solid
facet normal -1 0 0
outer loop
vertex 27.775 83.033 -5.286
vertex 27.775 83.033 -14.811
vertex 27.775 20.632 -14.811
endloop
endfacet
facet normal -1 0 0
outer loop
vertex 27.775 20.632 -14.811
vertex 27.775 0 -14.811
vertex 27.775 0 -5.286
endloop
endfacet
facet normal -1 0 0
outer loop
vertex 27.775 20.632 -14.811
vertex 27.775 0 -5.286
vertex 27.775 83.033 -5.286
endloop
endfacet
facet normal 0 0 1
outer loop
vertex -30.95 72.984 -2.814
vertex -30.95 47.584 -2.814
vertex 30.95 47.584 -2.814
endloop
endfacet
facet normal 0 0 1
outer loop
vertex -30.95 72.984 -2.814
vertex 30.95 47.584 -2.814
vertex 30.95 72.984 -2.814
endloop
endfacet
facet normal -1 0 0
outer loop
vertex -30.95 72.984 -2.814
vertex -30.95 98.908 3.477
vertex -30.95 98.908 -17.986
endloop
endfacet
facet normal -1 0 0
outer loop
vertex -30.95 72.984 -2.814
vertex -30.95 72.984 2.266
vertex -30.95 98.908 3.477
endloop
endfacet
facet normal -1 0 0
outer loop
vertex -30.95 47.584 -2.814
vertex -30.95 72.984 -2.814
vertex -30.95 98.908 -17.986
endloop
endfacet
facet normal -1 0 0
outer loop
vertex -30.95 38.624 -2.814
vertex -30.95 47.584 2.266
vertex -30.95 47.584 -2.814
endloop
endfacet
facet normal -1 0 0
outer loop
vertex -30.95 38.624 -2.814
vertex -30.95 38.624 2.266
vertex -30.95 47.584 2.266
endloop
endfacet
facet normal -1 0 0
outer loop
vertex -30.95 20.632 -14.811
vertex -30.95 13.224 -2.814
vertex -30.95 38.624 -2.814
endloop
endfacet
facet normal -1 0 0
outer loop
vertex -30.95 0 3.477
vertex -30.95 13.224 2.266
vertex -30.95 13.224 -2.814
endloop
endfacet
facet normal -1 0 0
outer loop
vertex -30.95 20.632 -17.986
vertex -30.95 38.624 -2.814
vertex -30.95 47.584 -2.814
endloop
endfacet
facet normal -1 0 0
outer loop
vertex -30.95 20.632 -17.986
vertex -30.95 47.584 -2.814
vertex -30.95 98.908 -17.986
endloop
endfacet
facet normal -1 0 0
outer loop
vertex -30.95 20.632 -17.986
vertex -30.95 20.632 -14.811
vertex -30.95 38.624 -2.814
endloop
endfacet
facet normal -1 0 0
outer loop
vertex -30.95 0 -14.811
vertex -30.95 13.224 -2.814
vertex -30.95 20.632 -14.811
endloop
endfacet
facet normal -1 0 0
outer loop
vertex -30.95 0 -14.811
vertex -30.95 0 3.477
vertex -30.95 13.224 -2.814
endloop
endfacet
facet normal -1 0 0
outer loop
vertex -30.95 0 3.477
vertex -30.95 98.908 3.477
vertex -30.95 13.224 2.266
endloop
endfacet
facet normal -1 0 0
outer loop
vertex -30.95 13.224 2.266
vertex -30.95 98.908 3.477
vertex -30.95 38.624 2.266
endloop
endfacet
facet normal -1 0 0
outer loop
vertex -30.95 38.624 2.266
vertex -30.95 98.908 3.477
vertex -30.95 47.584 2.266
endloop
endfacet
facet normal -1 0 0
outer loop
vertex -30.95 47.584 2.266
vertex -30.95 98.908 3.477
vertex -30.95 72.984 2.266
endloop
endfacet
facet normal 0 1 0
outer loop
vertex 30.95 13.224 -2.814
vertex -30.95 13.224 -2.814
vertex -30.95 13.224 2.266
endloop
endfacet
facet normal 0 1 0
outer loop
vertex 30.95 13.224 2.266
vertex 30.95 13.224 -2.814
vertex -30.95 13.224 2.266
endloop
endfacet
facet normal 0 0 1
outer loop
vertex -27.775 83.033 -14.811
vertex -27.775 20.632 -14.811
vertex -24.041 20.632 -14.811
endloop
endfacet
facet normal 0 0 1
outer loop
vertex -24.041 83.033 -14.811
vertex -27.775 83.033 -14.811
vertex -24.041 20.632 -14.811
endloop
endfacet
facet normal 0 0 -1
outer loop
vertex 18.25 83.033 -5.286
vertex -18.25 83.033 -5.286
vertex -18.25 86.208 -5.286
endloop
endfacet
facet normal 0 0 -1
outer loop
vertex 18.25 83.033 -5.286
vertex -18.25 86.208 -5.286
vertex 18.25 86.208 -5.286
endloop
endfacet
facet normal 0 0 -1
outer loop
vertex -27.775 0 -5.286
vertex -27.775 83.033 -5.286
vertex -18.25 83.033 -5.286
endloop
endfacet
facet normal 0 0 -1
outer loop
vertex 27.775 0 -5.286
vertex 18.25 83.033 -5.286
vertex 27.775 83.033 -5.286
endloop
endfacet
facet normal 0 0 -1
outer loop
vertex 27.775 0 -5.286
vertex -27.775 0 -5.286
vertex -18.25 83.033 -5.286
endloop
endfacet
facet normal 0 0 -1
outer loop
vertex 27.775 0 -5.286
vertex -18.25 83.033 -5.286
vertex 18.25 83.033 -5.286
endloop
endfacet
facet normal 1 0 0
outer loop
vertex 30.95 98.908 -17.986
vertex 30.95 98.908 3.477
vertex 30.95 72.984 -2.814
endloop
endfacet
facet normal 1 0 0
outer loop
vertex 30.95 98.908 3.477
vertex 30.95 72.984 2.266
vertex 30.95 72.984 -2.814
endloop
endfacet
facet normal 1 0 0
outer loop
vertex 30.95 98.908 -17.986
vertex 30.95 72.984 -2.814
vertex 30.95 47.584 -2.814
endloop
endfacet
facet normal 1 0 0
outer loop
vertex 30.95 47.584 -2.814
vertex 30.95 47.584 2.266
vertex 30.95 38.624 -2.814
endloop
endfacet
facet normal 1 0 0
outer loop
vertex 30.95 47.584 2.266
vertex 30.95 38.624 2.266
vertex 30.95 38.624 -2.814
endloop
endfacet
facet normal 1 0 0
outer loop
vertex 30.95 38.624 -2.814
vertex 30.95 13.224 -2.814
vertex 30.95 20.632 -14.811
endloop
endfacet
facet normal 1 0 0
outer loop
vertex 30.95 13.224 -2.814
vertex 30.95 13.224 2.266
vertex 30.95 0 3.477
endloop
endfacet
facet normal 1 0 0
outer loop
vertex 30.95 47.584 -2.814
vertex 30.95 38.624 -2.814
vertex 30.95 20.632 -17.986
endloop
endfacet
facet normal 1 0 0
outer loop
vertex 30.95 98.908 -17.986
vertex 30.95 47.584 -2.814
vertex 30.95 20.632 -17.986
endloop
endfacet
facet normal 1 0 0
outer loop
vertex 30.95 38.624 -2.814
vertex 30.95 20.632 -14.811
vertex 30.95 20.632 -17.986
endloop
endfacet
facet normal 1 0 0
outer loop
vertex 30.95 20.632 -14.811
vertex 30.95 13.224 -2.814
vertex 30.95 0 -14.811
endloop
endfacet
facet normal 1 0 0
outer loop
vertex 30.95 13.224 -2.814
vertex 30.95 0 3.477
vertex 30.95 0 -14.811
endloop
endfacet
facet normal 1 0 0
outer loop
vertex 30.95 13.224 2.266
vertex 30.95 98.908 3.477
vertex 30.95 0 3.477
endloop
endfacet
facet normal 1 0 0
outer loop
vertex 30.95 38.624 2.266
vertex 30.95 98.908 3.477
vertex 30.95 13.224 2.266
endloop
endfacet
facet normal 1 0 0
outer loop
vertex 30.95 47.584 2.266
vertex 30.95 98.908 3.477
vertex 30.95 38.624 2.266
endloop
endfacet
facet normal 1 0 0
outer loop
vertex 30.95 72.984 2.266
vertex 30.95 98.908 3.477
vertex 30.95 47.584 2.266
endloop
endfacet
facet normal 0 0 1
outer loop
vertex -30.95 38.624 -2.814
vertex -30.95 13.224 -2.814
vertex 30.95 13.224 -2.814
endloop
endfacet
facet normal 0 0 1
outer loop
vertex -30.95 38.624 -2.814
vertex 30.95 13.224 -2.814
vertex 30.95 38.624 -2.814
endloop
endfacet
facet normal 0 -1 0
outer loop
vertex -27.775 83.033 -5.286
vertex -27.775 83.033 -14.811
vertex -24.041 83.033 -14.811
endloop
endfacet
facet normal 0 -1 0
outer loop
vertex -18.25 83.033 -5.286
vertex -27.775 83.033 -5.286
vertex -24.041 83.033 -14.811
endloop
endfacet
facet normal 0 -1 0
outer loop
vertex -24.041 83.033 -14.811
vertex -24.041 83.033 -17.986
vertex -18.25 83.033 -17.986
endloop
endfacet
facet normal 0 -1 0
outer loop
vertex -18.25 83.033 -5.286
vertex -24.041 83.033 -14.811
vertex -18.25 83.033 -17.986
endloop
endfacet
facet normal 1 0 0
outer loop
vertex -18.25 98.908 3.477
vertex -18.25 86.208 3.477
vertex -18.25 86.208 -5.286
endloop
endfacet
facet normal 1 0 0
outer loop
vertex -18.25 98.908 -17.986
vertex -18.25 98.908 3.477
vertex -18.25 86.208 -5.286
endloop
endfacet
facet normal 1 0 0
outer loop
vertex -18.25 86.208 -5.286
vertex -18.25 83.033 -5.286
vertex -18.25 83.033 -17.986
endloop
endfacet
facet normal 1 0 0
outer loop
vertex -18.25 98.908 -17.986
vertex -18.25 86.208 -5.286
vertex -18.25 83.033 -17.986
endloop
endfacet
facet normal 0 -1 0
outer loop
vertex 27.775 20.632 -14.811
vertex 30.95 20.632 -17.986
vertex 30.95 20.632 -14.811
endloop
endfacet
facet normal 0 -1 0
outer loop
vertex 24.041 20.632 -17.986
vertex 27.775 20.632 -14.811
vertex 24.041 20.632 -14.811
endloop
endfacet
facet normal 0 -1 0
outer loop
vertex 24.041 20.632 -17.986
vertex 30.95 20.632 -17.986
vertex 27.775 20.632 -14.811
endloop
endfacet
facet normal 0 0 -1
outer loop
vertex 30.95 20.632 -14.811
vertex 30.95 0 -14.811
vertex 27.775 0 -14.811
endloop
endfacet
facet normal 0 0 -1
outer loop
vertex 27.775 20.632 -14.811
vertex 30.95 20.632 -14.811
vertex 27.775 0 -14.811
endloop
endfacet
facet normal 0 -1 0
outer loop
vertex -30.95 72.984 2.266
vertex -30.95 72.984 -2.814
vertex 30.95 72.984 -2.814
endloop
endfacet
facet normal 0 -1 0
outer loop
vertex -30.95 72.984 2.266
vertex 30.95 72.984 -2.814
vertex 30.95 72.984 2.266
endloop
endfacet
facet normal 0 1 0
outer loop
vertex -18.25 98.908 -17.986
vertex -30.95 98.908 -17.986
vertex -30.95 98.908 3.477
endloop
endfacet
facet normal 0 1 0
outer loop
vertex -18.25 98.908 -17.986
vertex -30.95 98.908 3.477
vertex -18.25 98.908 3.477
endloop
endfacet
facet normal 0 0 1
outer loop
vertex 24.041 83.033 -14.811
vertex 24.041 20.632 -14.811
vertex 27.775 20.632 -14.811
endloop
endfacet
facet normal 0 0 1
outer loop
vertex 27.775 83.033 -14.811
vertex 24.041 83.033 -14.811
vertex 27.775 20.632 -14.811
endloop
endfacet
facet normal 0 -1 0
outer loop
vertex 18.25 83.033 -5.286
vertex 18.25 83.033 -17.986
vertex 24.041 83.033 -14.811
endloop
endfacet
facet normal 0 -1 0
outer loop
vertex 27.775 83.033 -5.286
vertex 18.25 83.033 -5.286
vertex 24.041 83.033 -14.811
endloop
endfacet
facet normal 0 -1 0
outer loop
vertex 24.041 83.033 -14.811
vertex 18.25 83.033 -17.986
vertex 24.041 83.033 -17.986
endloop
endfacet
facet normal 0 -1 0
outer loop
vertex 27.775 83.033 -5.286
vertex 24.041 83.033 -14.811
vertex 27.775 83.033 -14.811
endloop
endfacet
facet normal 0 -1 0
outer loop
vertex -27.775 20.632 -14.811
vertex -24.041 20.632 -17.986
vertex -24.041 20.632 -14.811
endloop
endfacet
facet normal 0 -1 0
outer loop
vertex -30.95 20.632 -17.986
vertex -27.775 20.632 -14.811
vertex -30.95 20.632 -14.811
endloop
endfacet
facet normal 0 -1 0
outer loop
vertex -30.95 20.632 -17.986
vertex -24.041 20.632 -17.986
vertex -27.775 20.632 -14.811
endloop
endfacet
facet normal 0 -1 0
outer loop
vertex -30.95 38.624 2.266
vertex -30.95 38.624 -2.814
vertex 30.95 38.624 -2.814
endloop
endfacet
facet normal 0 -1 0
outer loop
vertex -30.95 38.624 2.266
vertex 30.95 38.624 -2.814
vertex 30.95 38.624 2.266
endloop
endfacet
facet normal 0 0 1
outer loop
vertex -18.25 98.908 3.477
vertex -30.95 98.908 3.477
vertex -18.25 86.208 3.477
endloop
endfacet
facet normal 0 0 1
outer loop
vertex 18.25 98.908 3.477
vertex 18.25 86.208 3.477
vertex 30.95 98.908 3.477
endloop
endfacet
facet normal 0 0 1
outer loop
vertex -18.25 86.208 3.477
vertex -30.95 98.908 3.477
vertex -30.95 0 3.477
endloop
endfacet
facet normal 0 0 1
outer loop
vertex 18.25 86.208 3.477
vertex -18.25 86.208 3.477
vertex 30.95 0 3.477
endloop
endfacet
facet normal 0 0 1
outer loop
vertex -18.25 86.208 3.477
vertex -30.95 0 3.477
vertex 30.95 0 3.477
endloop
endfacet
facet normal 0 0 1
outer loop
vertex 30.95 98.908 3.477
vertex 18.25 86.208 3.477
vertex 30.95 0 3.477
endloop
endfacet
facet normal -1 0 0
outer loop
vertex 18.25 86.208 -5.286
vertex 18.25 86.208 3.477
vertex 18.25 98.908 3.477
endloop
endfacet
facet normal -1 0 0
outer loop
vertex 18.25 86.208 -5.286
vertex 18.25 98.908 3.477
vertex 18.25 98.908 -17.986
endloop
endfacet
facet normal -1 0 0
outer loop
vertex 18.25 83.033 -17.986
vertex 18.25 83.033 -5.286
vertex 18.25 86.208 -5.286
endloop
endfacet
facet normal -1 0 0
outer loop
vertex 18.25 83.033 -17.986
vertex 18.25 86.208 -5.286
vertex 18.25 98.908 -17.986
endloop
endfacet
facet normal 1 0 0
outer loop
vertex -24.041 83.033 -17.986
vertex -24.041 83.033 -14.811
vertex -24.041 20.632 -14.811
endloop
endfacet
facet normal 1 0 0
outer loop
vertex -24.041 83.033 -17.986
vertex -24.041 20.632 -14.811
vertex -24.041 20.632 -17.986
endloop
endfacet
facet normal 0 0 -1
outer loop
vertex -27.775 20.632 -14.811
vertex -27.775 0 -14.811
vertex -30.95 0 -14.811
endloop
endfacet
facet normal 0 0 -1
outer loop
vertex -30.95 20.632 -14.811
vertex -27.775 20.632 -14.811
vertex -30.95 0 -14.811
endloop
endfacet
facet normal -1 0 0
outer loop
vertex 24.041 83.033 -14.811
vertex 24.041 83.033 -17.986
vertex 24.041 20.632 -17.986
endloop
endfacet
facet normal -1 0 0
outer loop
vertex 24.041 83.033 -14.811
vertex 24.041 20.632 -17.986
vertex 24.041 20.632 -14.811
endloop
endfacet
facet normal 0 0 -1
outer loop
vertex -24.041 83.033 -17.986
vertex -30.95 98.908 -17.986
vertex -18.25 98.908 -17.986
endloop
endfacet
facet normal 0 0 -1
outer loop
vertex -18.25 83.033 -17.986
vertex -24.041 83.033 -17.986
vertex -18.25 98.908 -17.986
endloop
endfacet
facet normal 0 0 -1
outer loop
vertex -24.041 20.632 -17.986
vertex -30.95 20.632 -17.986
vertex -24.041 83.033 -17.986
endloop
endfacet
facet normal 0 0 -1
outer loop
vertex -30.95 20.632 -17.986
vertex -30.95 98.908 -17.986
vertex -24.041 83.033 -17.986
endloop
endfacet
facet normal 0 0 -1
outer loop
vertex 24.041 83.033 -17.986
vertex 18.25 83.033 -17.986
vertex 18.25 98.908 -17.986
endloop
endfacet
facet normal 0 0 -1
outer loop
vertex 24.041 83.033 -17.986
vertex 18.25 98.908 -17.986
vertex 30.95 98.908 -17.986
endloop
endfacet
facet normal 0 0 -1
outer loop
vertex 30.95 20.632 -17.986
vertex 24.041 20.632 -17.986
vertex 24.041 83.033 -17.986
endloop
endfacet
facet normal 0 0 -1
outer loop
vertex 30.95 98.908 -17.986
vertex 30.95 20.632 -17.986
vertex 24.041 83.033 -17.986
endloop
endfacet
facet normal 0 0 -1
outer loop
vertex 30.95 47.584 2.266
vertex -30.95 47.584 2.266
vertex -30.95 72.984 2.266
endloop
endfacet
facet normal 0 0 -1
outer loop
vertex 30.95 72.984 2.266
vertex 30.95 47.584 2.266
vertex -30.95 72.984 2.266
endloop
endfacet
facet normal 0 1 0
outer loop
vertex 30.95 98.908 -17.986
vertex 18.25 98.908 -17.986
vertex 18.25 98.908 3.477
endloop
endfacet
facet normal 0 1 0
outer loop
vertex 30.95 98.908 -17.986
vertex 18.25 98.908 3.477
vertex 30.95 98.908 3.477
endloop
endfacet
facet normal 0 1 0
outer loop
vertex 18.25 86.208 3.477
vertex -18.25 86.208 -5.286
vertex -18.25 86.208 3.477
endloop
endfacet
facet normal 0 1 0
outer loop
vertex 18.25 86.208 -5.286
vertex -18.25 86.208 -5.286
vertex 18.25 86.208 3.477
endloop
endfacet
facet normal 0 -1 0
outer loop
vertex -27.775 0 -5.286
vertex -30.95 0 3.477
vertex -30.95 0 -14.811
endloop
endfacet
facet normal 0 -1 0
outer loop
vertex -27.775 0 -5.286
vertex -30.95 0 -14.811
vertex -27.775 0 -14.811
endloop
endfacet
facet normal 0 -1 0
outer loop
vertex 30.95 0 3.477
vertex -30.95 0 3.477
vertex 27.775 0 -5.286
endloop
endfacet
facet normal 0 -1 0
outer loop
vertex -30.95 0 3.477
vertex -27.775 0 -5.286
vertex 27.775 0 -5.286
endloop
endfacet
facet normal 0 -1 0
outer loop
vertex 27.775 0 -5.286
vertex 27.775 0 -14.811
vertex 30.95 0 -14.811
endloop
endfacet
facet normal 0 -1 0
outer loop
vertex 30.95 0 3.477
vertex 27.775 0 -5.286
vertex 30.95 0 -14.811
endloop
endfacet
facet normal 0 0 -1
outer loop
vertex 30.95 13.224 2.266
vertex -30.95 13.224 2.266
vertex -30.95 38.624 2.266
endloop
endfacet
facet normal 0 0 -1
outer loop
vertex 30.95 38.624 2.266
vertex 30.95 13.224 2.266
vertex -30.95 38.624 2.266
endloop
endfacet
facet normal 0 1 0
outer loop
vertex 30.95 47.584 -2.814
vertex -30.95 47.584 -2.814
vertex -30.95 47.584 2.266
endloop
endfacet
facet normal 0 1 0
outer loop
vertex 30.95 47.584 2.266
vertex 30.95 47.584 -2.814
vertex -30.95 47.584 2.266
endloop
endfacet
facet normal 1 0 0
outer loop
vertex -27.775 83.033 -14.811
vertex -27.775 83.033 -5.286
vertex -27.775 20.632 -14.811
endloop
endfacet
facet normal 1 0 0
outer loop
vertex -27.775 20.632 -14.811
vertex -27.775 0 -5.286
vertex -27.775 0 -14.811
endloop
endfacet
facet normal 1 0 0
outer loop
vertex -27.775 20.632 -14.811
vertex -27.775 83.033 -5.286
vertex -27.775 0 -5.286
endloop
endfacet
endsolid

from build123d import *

# Parameters (mm, degrees)
BOSS_EXTRUDE1_DEPTH = 83.0326
SKETCH6_W           = 61.8998
SKETCH6_H           = 21.463
BOSS_EXTRUDE3_DEPTH = 3.175
SKETCH7_W           = 16.5354
SKETCH7_H           = 9.525
CUT_EXTRUDE2_DEPTH  = 91.420129415
SKETCH8_W           = 5.08
SKETCH8_H           = 25.4
CUT_EXTRUDE3_DEPTH  = 108.64212172
SKETCH15_W          = 61.8998
SKETCH15_H          = 20.63242
CUT_EXTRUDE4_DEPTH  = 3.175
SKETCH16_W          = 36.4998
SKETCH16_H          = 12.7
CUT_EXTRUDE5_DEPTH  = 3.175
SKETCH17_W          = 12.7
SKETCH17_H          = 21.463
BOSS_EXTRUDE4_DEPTH = 12.7


with BuildPart() as part:
    # Sketch1 → Boss-Extrude1 (new body)
    with BuildSketch(Plane(origin=(0, 0, 0), x_dir=(1, 0, 0), z_dir=(0, 1, 0))):
        Polygon((-30.9499, -3.477149156), (30.9499, -3.477149156), (30.9499, 17.985850844), (24.0411, 17.985850844), (24.0411, 14.810850844), (27.7749, 14.810850844), (27.7749, 5.285850844), (-27.7749, 5.285850844), (-27.7749, 14.810850844), (-24.0411, 14.810850844), (-24.0411, 17.985850844), (-30.9499, 17.985850844), align=None)
    extrude(amount=BOSS_EXTRUDE1_DEPTH)

    # Sketch6 → Boss-Extrude3 (add)
    with BuildSketch(Plane(origin=(0, 83.0326, 0), x_dir=(1, 0, 0), z_dir=(0, 1, 0))):
        with Locations((0, 7.254350844)):
            Rectangle(SKETCH6_W, SKETCH6_H)
    extrude(amount=BOSS_EXTRUDE3_DEPTH)

    # Sketch7 → Cut-Extrude2 (cut, through all)
    with BuildSketch(Plane.XZ.offset(-83.0326)):
        with Locations((0, -10.048350844)):
            Rectangle(SKETCH7_W, SKETCH7_H)
    extrude(amount=-CUT_EXTRUDE2_DEPTH, mode=Mode.SUBTRACT)

    # Sketch8 → Cut-Extrude3 (cut, through all)
    with BuildSketch(Plane.ZY.offset(30.9499)):
        with Locations((-0.274453158, 60.28364576)):
            Rectangle(SKETCH8_W, SKETCH8_H)
        with Locations((-0.274453158, 25.92395424)):
            Rectangle(SKETCH8_W, SKETCH8_H)
    extrude(amount=-CUT_EXTRUDE3_DEPTH, mode=Mode.SUBTRACT)

    # Sketch15 → Cut-Extrude4 (cut)
    with BuildSketch(Plane(origin=(0, 0, -17.985850844), x_dir=(-1, 0, 0), z_dir=(0, 0, -1))):
        with Locations((0, 10.31621)):
            Rectangle(SKETCH15_W, SKETCH15_H)
    extrude(amount=-CUT_EXTRUDE4_DEPTH, mode=Mode.SUBTRACT)

    # Sketch16 → Cut-Extrude5 (cut)
    with BuildSketch(Plane(origin=(0, 86.2076, 0), x_dir=(1, 0, 0), z_dir=(0, 1, 0))):
        with Locations((0, 11.635850844)):
            Rectangle(SKETCH16_W, SKETCH16_H)
    extrude(amount=-CUT_EXTRUDE5_DEPTH, mode=Mode.SUBTRACT)

    # Sketch17 → Boss-Extrude4 (add)
    with BuildSketch(Plane(origin=(0, 86.2076, 0), x_dir=(1, 0, 0), z_dir=(0, 1, 0))):
        with Locations((-24.5999, 7.254350844)):
            Rectangle(SKETCH17_W, SKETCH17_H)
        with Locations((24.5999, 7.254350844)):
            Rectangle(SKETCH17_W, SKETCH17_H)
    extrude(amount=BOSS_EXTRUDE4_DEPTH)


solid = part.part
